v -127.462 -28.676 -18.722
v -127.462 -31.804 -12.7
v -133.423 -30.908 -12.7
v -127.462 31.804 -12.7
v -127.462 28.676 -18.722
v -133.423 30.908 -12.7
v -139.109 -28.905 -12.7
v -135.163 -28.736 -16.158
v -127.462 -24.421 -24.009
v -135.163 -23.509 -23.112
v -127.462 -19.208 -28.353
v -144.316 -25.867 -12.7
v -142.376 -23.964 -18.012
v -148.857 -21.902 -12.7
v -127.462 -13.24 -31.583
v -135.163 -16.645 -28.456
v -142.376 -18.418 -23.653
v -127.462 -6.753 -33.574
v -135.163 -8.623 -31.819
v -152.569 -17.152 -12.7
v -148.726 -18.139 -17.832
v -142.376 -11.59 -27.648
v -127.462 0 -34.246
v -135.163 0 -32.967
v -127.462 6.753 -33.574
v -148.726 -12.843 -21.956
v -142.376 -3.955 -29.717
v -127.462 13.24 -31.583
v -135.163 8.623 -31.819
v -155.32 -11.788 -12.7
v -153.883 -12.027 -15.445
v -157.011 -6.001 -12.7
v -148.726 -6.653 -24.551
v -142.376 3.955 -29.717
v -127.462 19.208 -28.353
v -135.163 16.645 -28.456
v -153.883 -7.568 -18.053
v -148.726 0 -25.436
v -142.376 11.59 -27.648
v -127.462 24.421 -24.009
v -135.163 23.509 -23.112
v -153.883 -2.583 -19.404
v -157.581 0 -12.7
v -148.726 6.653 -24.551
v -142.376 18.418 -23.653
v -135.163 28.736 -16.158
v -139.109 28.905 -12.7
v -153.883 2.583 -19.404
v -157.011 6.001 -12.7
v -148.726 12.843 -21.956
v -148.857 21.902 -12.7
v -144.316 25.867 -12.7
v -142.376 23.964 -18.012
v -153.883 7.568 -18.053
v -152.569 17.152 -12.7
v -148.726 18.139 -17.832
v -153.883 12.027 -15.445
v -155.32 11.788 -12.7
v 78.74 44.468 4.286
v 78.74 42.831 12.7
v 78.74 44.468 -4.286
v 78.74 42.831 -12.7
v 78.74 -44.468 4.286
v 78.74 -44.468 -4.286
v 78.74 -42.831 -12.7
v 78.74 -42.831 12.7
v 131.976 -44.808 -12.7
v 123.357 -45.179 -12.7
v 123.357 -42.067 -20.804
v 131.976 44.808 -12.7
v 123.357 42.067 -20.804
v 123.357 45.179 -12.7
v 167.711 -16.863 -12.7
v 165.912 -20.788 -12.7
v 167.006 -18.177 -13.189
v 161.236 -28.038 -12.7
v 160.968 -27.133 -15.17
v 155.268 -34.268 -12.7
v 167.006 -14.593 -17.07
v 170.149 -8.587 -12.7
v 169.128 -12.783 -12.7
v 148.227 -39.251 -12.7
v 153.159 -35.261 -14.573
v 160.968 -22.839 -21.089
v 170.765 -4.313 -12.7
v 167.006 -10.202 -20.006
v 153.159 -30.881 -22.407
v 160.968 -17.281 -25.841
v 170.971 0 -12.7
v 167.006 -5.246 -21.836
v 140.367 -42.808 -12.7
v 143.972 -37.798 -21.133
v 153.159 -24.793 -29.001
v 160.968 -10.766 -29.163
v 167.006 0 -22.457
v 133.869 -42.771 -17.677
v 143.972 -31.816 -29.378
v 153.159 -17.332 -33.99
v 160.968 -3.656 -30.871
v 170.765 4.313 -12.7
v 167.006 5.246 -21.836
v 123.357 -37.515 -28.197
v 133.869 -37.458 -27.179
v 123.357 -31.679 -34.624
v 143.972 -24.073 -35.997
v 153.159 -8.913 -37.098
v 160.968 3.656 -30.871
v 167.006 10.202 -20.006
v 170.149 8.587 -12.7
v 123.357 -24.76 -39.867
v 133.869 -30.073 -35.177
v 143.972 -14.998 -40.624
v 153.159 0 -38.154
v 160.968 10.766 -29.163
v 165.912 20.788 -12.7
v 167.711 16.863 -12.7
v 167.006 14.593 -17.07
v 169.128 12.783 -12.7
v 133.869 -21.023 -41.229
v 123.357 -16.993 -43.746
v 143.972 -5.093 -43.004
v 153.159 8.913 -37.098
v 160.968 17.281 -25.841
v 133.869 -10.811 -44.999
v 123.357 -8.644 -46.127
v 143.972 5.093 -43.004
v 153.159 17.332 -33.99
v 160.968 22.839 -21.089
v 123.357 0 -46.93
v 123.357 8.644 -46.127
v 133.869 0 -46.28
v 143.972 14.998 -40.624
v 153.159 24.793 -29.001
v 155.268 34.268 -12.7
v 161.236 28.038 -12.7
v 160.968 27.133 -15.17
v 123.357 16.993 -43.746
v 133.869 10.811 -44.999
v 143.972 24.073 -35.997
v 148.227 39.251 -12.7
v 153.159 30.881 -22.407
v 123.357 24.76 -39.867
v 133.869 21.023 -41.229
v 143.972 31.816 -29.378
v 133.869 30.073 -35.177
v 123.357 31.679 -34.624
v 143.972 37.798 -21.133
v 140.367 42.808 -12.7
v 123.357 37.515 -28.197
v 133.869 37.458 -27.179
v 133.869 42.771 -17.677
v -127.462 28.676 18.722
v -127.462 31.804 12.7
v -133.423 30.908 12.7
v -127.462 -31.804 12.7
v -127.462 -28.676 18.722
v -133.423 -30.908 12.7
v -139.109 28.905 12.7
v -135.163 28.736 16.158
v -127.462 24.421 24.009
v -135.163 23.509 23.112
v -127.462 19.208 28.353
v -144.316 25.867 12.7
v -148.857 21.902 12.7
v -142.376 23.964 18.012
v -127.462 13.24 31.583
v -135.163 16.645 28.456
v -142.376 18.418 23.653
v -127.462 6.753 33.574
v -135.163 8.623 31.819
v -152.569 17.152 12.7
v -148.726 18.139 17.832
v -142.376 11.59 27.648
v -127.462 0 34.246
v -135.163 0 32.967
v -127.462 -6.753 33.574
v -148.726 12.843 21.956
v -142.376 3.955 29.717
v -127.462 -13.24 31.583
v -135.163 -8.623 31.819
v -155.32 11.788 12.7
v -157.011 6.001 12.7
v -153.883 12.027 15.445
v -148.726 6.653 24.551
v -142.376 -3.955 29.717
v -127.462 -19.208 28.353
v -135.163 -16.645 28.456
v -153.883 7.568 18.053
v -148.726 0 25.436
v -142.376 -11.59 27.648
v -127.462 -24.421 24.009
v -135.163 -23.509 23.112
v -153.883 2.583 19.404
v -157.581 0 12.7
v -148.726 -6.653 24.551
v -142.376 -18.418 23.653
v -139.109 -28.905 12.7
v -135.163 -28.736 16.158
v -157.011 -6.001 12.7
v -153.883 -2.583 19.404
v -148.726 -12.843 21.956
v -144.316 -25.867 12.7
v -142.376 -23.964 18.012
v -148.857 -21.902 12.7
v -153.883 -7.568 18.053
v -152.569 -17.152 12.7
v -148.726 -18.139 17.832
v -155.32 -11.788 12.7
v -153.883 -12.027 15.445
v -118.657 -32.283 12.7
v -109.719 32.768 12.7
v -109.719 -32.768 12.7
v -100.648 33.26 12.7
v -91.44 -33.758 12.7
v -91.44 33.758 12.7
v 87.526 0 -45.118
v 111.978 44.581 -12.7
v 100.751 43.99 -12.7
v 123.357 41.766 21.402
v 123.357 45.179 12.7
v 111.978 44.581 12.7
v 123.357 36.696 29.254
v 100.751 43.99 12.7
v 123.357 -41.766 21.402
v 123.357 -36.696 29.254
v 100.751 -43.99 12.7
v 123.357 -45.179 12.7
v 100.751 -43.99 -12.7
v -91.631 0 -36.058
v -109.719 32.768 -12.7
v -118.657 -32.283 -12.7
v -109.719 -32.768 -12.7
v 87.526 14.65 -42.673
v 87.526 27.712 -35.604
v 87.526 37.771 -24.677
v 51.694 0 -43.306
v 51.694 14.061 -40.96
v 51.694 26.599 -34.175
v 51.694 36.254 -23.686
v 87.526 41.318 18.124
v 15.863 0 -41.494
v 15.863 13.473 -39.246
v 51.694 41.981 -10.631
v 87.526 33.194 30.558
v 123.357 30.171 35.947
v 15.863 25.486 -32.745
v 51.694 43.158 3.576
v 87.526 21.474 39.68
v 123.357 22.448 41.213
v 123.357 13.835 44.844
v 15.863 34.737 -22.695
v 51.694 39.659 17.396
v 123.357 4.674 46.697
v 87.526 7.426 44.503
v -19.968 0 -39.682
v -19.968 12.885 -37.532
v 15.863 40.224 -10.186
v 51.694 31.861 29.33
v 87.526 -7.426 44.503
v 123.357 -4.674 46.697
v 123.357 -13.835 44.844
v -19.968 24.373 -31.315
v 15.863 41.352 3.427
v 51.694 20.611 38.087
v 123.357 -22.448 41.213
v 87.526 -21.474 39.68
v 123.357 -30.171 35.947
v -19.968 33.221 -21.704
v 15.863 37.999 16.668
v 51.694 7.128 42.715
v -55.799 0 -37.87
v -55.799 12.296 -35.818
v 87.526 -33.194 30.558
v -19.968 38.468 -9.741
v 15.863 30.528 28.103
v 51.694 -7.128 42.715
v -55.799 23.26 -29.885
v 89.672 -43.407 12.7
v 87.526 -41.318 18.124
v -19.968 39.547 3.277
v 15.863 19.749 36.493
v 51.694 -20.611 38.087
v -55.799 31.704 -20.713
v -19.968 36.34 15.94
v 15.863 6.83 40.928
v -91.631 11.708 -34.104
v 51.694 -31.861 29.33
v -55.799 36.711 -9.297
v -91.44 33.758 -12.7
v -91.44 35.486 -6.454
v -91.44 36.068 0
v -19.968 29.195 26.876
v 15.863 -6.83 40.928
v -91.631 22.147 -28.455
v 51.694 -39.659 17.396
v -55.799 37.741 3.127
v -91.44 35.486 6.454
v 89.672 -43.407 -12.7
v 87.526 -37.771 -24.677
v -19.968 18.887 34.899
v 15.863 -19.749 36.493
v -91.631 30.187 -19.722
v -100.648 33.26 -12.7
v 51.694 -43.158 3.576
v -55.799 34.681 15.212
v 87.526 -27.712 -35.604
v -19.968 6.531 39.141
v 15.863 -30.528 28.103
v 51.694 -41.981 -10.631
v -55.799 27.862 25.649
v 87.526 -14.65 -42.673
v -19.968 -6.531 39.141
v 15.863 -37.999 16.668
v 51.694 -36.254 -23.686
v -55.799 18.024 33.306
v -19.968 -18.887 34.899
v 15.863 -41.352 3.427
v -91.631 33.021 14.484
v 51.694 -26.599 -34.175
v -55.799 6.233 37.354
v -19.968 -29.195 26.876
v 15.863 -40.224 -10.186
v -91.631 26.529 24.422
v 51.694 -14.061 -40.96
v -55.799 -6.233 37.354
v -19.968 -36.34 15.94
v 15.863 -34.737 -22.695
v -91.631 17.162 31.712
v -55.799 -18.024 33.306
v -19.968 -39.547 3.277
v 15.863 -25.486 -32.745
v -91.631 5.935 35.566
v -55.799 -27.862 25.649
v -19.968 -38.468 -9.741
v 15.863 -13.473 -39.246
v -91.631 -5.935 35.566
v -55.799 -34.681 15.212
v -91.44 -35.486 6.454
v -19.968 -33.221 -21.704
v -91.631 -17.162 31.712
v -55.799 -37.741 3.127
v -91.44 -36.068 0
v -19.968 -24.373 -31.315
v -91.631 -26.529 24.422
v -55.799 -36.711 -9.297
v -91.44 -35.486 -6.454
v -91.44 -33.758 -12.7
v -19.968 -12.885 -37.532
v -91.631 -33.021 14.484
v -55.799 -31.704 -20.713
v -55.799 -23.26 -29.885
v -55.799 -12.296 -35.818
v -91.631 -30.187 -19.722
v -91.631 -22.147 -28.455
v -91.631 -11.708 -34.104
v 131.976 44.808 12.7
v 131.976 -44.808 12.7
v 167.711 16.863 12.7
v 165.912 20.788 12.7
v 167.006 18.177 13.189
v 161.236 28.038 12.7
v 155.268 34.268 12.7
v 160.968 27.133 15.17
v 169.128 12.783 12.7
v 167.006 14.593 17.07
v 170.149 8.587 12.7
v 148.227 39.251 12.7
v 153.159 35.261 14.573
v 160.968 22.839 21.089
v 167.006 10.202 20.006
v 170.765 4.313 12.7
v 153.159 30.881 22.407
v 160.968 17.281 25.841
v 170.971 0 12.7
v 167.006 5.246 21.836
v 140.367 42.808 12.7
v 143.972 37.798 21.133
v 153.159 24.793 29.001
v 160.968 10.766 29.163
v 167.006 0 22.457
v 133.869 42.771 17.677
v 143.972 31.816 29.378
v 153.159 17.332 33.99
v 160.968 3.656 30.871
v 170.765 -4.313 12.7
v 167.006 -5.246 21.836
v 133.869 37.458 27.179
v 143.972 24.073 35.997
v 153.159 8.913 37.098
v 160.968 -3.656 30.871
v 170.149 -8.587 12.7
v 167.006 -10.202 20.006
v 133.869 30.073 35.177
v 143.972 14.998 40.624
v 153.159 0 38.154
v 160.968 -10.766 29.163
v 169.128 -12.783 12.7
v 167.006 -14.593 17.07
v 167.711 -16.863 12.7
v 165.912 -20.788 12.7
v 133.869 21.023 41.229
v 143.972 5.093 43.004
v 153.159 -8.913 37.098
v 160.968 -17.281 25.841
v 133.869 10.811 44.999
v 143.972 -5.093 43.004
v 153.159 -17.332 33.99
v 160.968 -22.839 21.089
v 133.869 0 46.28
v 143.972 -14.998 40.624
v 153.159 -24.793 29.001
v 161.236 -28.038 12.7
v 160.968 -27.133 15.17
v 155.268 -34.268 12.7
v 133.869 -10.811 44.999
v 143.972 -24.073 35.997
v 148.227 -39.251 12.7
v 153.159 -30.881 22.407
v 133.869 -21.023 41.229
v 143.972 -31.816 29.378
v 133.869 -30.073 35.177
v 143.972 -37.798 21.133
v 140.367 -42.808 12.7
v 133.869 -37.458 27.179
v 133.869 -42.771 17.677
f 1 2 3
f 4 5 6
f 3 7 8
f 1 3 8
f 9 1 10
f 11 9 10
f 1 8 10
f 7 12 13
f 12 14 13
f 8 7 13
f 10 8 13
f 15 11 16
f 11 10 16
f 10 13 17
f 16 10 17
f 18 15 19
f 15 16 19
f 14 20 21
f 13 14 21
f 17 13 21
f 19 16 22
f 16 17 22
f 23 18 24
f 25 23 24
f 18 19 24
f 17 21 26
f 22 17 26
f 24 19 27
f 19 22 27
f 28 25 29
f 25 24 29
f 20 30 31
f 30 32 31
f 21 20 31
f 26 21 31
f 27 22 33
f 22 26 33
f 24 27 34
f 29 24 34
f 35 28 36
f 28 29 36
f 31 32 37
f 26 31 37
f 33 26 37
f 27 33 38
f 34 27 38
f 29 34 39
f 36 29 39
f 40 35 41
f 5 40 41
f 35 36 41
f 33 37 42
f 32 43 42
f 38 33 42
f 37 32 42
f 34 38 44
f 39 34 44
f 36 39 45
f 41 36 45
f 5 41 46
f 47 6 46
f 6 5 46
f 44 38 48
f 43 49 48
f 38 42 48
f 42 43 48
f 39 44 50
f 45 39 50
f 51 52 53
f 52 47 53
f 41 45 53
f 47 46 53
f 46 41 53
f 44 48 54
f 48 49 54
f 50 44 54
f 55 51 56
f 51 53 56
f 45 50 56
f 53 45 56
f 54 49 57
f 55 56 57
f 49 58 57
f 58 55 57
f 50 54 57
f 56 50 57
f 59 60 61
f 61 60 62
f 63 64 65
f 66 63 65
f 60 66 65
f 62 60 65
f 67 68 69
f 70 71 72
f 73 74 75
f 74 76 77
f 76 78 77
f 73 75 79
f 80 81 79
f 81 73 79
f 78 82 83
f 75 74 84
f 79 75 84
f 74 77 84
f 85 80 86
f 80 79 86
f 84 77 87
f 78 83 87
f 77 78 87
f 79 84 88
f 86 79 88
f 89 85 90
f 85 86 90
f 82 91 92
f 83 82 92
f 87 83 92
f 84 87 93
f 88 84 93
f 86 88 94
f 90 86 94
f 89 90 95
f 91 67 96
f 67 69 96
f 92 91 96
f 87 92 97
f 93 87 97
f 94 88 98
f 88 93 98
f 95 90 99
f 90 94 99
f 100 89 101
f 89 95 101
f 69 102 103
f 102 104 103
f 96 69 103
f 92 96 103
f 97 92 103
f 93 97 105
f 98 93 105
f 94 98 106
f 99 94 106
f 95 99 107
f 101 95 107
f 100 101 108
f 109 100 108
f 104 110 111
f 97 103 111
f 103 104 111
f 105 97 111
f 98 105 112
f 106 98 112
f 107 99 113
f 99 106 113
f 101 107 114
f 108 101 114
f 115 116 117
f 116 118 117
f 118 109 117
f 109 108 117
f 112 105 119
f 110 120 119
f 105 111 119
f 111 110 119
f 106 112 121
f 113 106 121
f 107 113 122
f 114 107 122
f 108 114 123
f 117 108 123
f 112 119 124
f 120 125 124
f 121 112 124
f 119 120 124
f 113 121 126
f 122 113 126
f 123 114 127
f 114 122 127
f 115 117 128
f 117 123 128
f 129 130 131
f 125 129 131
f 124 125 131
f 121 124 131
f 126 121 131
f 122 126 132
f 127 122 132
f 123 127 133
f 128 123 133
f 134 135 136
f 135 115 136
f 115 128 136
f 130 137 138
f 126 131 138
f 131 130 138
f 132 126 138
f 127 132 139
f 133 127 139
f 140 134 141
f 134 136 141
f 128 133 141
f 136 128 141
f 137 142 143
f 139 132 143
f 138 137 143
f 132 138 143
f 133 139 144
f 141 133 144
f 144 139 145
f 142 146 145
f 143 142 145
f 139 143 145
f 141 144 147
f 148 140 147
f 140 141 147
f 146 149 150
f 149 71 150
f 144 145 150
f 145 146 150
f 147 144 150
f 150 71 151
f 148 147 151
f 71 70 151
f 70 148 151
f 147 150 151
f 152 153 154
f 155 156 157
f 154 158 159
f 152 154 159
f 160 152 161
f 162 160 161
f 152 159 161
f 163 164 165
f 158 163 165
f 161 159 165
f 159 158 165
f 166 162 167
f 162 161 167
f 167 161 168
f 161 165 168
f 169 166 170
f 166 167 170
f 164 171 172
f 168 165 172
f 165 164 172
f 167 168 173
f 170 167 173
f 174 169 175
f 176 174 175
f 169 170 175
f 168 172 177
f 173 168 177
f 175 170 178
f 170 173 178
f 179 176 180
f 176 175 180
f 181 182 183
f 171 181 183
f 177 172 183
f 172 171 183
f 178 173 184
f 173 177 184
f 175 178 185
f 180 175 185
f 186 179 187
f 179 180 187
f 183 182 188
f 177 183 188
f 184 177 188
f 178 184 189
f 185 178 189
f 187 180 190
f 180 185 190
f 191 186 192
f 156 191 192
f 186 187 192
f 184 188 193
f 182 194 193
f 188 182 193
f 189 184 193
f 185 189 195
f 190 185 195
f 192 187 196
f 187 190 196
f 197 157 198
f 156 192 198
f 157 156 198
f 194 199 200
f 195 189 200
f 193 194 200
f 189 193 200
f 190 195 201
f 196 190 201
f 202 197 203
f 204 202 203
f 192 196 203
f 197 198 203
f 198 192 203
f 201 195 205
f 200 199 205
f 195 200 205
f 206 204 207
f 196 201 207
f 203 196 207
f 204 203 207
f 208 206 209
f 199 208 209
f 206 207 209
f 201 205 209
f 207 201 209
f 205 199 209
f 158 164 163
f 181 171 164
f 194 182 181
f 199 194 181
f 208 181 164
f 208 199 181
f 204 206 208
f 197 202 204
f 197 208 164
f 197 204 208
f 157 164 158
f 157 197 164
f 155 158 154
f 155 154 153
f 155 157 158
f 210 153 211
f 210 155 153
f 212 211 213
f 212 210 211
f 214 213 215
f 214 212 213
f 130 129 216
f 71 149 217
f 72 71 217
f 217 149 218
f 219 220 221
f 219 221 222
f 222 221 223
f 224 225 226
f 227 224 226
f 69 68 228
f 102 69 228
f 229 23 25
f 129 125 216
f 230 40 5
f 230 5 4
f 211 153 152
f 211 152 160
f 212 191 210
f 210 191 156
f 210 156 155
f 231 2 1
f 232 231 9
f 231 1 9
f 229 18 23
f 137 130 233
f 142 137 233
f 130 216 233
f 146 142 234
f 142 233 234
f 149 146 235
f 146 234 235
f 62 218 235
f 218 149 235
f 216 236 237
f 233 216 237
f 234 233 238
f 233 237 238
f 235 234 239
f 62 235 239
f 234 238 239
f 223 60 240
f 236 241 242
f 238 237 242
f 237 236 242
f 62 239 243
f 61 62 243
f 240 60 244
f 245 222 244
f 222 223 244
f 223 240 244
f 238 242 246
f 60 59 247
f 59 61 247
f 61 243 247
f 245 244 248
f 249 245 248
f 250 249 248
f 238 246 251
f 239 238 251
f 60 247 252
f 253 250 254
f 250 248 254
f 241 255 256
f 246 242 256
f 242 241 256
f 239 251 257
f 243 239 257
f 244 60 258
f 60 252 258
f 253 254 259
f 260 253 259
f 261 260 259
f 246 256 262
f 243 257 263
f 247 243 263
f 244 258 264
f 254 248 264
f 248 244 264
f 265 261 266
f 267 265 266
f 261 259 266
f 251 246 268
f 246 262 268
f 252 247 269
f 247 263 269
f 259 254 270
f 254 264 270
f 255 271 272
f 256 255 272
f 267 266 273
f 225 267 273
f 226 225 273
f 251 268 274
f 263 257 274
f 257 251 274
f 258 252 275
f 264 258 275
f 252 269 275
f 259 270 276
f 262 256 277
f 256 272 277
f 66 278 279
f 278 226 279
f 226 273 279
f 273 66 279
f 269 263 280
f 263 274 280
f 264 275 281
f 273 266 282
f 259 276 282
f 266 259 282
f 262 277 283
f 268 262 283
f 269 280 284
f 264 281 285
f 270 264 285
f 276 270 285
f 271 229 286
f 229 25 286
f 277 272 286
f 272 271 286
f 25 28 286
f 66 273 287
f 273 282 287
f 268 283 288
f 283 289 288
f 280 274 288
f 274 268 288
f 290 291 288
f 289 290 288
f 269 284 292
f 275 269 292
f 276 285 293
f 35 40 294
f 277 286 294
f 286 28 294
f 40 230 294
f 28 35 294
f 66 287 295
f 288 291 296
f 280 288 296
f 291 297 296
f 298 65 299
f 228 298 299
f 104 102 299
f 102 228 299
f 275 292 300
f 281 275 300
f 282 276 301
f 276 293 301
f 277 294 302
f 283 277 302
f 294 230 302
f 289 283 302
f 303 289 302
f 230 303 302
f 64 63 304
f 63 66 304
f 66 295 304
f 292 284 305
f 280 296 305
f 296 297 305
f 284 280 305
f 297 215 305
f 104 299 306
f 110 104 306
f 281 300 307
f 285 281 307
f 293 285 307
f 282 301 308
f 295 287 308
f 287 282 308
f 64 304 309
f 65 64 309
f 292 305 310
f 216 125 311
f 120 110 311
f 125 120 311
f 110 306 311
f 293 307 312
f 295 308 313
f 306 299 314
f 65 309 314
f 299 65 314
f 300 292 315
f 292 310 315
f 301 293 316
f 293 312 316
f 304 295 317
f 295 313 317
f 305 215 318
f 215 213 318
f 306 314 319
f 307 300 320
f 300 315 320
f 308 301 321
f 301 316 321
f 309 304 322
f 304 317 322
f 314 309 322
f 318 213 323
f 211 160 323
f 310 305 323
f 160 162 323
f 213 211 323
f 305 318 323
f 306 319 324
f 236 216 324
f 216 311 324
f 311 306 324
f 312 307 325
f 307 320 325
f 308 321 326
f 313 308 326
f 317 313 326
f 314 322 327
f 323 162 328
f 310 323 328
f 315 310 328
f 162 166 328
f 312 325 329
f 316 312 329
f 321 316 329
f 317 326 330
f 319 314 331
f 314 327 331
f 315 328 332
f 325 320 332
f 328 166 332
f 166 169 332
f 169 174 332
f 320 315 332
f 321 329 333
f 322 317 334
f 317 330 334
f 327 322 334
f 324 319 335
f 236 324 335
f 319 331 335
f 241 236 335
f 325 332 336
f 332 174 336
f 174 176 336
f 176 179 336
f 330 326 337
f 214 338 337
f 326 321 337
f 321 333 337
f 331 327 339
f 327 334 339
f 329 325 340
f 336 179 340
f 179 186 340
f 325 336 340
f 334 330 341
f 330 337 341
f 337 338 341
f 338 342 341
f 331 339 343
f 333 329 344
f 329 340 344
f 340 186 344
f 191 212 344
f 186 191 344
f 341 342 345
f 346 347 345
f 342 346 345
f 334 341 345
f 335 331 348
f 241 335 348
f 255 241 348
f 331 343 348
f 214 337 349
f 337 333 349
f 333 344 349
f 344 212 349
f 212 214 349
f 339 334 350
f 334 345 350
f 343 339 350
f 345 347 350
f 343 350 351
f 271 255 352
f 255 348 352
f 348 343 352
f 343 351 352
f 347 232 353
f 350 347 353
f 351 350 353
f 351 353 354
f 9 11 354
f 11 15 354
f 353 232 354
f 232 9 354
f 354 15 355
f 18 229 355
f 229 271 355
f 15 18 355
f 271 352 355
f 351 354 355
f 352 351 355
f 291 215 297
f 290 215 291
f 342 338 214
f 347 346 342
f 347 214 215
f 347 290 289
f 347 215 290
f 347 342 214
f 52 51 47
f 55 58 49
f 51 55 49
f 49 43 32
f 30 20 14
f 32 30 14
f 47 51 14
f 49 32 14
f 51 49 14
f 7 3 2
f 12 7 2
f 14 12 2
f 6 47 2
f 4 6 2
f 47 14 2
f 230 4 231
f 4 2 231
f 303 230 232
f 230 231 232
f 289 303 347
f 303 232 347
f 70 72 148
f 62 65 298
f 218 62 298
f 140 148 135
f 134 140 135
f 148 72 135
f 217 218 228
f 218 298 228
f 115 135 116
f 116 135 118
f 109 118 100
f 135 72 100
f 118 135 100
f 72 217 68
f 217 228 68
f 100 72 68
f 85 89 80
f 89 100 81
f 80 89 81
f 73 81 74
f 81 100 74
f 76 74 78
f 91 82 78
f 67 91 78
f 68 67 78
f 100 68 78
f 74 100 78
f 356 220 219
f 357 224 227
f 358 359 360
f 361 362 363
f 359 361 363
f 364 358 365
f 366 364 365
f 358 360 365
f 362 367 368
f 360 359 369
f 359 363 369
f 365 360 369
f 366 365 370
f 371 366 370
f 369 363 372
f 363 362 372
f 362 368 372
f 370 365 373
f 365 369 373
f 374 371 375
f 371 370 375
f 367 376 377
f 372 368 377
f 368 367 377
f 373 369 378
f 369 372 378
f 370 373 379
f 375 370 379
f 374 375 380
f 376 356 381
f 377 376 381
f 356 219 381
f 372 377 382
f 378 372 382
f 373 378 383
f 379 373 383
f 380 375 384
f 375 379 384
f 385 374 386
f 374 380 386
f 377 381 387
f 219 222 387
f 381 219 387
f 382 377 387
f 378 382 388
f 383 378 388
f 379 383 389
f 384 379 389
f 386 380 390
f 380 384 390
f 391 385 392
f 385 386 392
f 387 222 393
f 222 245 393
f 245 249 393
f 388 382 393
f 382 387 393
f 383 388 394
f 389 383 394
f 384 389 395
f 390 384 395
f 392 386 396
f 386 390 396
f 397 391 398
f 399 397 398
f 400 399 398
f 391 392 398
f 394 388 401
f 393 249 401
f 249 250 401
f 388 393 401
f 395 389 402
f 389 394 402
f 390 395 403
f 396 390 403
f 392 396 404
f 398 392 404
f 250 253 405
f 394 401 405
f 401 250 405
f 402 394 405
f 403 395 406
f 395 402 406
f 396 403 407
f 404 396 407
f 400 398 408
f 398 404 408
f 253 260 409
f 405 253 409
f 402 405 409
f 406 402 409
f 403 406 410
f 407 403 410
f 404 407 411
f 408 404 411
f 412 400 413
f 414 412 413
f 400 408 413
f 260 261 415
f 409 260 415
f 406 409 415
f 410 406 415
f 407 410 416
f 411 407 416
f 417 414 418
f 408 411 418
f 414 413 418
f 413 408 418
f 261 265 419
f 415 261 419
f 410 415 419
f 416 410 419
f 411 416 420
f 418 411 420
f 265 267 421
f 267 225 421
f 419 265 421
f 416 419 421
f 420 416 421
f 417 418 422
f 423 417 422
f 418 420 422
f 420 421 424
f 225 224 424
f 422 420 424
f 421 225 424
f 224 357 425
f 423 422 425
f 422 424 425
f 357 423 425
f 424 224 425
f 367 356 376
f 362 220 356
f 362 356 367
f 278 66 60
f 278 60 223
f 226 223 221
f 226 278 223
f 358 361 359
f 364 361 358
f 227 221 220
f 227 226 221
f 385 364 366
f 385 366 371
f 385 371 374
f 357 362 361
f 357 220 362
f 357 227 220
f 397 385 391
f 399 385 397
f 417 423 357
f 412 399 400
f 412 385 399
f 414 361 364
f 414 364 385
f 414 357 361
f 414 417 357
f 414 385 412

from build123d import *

# Parameters (mm, degrees)
CUT_EXTRUDE1_DEPTH      = 186.063012512
CUT_EXTRUDE1_DEPTH_BACK = 186.063012512
SKETCH4_W               = 93.98
SKETCH4_H               = 25.4
SKETCH4_W_2             = 68.58


with BuildPart() as part:
    # Sketch3 → Revolve2 (revolve)
    with BuildSketch(Plane(origin=(0, 0, 0), x_dir=(1, 0, 0), z_dir=(0, 1, 0))):
        with BuildLine():
            Line((-125.73, 0), (125.73, 0))
            Line((125.73, 0), (172.72, 0))
            ThreePointArc((172.72, 0), (158.10701278, 34.05567711), (123.356767677, 46.930031625))
            Line((123.356767677, 46.930031625), (-127.461818182, 34.246239294))
            ThreePointArc((-127.461818182, 34.246239294), (-150.581440053, 23.626468786), (-160.02, 0))
            Line((-160.02, 0), (-125.73, 0))
        make_face()
    revolve(axis=Axis((-1000, 0, 0), (1, 0, 0)))

    # Sketch4 → Cut-Extrude1 (cut, two sides: drawn at the far end of the back side and taken through both)
    with BuildSketch(Plane(origin=(0, 0, 0), x_dir=(1, 0, 0), z_dir=(0, 1, 0)).offset(-CUT_EXTRUDE1_DEPTH_BACK)):
        with Locations((125.73, 0)):
            Rectangle(SKETCH4_W, SKETCH4_H)
        with Locations((-125.73, 0)):
            Rectangle(SKETCH4_W_2, SKETCH4_H)
    extrude(amount=CUT_EXTRUDE1_DEPTH + CUT_EXTRUDE1_DEPTH_BACK, mode=Mode.SUBTRACT)


solid = part.part
